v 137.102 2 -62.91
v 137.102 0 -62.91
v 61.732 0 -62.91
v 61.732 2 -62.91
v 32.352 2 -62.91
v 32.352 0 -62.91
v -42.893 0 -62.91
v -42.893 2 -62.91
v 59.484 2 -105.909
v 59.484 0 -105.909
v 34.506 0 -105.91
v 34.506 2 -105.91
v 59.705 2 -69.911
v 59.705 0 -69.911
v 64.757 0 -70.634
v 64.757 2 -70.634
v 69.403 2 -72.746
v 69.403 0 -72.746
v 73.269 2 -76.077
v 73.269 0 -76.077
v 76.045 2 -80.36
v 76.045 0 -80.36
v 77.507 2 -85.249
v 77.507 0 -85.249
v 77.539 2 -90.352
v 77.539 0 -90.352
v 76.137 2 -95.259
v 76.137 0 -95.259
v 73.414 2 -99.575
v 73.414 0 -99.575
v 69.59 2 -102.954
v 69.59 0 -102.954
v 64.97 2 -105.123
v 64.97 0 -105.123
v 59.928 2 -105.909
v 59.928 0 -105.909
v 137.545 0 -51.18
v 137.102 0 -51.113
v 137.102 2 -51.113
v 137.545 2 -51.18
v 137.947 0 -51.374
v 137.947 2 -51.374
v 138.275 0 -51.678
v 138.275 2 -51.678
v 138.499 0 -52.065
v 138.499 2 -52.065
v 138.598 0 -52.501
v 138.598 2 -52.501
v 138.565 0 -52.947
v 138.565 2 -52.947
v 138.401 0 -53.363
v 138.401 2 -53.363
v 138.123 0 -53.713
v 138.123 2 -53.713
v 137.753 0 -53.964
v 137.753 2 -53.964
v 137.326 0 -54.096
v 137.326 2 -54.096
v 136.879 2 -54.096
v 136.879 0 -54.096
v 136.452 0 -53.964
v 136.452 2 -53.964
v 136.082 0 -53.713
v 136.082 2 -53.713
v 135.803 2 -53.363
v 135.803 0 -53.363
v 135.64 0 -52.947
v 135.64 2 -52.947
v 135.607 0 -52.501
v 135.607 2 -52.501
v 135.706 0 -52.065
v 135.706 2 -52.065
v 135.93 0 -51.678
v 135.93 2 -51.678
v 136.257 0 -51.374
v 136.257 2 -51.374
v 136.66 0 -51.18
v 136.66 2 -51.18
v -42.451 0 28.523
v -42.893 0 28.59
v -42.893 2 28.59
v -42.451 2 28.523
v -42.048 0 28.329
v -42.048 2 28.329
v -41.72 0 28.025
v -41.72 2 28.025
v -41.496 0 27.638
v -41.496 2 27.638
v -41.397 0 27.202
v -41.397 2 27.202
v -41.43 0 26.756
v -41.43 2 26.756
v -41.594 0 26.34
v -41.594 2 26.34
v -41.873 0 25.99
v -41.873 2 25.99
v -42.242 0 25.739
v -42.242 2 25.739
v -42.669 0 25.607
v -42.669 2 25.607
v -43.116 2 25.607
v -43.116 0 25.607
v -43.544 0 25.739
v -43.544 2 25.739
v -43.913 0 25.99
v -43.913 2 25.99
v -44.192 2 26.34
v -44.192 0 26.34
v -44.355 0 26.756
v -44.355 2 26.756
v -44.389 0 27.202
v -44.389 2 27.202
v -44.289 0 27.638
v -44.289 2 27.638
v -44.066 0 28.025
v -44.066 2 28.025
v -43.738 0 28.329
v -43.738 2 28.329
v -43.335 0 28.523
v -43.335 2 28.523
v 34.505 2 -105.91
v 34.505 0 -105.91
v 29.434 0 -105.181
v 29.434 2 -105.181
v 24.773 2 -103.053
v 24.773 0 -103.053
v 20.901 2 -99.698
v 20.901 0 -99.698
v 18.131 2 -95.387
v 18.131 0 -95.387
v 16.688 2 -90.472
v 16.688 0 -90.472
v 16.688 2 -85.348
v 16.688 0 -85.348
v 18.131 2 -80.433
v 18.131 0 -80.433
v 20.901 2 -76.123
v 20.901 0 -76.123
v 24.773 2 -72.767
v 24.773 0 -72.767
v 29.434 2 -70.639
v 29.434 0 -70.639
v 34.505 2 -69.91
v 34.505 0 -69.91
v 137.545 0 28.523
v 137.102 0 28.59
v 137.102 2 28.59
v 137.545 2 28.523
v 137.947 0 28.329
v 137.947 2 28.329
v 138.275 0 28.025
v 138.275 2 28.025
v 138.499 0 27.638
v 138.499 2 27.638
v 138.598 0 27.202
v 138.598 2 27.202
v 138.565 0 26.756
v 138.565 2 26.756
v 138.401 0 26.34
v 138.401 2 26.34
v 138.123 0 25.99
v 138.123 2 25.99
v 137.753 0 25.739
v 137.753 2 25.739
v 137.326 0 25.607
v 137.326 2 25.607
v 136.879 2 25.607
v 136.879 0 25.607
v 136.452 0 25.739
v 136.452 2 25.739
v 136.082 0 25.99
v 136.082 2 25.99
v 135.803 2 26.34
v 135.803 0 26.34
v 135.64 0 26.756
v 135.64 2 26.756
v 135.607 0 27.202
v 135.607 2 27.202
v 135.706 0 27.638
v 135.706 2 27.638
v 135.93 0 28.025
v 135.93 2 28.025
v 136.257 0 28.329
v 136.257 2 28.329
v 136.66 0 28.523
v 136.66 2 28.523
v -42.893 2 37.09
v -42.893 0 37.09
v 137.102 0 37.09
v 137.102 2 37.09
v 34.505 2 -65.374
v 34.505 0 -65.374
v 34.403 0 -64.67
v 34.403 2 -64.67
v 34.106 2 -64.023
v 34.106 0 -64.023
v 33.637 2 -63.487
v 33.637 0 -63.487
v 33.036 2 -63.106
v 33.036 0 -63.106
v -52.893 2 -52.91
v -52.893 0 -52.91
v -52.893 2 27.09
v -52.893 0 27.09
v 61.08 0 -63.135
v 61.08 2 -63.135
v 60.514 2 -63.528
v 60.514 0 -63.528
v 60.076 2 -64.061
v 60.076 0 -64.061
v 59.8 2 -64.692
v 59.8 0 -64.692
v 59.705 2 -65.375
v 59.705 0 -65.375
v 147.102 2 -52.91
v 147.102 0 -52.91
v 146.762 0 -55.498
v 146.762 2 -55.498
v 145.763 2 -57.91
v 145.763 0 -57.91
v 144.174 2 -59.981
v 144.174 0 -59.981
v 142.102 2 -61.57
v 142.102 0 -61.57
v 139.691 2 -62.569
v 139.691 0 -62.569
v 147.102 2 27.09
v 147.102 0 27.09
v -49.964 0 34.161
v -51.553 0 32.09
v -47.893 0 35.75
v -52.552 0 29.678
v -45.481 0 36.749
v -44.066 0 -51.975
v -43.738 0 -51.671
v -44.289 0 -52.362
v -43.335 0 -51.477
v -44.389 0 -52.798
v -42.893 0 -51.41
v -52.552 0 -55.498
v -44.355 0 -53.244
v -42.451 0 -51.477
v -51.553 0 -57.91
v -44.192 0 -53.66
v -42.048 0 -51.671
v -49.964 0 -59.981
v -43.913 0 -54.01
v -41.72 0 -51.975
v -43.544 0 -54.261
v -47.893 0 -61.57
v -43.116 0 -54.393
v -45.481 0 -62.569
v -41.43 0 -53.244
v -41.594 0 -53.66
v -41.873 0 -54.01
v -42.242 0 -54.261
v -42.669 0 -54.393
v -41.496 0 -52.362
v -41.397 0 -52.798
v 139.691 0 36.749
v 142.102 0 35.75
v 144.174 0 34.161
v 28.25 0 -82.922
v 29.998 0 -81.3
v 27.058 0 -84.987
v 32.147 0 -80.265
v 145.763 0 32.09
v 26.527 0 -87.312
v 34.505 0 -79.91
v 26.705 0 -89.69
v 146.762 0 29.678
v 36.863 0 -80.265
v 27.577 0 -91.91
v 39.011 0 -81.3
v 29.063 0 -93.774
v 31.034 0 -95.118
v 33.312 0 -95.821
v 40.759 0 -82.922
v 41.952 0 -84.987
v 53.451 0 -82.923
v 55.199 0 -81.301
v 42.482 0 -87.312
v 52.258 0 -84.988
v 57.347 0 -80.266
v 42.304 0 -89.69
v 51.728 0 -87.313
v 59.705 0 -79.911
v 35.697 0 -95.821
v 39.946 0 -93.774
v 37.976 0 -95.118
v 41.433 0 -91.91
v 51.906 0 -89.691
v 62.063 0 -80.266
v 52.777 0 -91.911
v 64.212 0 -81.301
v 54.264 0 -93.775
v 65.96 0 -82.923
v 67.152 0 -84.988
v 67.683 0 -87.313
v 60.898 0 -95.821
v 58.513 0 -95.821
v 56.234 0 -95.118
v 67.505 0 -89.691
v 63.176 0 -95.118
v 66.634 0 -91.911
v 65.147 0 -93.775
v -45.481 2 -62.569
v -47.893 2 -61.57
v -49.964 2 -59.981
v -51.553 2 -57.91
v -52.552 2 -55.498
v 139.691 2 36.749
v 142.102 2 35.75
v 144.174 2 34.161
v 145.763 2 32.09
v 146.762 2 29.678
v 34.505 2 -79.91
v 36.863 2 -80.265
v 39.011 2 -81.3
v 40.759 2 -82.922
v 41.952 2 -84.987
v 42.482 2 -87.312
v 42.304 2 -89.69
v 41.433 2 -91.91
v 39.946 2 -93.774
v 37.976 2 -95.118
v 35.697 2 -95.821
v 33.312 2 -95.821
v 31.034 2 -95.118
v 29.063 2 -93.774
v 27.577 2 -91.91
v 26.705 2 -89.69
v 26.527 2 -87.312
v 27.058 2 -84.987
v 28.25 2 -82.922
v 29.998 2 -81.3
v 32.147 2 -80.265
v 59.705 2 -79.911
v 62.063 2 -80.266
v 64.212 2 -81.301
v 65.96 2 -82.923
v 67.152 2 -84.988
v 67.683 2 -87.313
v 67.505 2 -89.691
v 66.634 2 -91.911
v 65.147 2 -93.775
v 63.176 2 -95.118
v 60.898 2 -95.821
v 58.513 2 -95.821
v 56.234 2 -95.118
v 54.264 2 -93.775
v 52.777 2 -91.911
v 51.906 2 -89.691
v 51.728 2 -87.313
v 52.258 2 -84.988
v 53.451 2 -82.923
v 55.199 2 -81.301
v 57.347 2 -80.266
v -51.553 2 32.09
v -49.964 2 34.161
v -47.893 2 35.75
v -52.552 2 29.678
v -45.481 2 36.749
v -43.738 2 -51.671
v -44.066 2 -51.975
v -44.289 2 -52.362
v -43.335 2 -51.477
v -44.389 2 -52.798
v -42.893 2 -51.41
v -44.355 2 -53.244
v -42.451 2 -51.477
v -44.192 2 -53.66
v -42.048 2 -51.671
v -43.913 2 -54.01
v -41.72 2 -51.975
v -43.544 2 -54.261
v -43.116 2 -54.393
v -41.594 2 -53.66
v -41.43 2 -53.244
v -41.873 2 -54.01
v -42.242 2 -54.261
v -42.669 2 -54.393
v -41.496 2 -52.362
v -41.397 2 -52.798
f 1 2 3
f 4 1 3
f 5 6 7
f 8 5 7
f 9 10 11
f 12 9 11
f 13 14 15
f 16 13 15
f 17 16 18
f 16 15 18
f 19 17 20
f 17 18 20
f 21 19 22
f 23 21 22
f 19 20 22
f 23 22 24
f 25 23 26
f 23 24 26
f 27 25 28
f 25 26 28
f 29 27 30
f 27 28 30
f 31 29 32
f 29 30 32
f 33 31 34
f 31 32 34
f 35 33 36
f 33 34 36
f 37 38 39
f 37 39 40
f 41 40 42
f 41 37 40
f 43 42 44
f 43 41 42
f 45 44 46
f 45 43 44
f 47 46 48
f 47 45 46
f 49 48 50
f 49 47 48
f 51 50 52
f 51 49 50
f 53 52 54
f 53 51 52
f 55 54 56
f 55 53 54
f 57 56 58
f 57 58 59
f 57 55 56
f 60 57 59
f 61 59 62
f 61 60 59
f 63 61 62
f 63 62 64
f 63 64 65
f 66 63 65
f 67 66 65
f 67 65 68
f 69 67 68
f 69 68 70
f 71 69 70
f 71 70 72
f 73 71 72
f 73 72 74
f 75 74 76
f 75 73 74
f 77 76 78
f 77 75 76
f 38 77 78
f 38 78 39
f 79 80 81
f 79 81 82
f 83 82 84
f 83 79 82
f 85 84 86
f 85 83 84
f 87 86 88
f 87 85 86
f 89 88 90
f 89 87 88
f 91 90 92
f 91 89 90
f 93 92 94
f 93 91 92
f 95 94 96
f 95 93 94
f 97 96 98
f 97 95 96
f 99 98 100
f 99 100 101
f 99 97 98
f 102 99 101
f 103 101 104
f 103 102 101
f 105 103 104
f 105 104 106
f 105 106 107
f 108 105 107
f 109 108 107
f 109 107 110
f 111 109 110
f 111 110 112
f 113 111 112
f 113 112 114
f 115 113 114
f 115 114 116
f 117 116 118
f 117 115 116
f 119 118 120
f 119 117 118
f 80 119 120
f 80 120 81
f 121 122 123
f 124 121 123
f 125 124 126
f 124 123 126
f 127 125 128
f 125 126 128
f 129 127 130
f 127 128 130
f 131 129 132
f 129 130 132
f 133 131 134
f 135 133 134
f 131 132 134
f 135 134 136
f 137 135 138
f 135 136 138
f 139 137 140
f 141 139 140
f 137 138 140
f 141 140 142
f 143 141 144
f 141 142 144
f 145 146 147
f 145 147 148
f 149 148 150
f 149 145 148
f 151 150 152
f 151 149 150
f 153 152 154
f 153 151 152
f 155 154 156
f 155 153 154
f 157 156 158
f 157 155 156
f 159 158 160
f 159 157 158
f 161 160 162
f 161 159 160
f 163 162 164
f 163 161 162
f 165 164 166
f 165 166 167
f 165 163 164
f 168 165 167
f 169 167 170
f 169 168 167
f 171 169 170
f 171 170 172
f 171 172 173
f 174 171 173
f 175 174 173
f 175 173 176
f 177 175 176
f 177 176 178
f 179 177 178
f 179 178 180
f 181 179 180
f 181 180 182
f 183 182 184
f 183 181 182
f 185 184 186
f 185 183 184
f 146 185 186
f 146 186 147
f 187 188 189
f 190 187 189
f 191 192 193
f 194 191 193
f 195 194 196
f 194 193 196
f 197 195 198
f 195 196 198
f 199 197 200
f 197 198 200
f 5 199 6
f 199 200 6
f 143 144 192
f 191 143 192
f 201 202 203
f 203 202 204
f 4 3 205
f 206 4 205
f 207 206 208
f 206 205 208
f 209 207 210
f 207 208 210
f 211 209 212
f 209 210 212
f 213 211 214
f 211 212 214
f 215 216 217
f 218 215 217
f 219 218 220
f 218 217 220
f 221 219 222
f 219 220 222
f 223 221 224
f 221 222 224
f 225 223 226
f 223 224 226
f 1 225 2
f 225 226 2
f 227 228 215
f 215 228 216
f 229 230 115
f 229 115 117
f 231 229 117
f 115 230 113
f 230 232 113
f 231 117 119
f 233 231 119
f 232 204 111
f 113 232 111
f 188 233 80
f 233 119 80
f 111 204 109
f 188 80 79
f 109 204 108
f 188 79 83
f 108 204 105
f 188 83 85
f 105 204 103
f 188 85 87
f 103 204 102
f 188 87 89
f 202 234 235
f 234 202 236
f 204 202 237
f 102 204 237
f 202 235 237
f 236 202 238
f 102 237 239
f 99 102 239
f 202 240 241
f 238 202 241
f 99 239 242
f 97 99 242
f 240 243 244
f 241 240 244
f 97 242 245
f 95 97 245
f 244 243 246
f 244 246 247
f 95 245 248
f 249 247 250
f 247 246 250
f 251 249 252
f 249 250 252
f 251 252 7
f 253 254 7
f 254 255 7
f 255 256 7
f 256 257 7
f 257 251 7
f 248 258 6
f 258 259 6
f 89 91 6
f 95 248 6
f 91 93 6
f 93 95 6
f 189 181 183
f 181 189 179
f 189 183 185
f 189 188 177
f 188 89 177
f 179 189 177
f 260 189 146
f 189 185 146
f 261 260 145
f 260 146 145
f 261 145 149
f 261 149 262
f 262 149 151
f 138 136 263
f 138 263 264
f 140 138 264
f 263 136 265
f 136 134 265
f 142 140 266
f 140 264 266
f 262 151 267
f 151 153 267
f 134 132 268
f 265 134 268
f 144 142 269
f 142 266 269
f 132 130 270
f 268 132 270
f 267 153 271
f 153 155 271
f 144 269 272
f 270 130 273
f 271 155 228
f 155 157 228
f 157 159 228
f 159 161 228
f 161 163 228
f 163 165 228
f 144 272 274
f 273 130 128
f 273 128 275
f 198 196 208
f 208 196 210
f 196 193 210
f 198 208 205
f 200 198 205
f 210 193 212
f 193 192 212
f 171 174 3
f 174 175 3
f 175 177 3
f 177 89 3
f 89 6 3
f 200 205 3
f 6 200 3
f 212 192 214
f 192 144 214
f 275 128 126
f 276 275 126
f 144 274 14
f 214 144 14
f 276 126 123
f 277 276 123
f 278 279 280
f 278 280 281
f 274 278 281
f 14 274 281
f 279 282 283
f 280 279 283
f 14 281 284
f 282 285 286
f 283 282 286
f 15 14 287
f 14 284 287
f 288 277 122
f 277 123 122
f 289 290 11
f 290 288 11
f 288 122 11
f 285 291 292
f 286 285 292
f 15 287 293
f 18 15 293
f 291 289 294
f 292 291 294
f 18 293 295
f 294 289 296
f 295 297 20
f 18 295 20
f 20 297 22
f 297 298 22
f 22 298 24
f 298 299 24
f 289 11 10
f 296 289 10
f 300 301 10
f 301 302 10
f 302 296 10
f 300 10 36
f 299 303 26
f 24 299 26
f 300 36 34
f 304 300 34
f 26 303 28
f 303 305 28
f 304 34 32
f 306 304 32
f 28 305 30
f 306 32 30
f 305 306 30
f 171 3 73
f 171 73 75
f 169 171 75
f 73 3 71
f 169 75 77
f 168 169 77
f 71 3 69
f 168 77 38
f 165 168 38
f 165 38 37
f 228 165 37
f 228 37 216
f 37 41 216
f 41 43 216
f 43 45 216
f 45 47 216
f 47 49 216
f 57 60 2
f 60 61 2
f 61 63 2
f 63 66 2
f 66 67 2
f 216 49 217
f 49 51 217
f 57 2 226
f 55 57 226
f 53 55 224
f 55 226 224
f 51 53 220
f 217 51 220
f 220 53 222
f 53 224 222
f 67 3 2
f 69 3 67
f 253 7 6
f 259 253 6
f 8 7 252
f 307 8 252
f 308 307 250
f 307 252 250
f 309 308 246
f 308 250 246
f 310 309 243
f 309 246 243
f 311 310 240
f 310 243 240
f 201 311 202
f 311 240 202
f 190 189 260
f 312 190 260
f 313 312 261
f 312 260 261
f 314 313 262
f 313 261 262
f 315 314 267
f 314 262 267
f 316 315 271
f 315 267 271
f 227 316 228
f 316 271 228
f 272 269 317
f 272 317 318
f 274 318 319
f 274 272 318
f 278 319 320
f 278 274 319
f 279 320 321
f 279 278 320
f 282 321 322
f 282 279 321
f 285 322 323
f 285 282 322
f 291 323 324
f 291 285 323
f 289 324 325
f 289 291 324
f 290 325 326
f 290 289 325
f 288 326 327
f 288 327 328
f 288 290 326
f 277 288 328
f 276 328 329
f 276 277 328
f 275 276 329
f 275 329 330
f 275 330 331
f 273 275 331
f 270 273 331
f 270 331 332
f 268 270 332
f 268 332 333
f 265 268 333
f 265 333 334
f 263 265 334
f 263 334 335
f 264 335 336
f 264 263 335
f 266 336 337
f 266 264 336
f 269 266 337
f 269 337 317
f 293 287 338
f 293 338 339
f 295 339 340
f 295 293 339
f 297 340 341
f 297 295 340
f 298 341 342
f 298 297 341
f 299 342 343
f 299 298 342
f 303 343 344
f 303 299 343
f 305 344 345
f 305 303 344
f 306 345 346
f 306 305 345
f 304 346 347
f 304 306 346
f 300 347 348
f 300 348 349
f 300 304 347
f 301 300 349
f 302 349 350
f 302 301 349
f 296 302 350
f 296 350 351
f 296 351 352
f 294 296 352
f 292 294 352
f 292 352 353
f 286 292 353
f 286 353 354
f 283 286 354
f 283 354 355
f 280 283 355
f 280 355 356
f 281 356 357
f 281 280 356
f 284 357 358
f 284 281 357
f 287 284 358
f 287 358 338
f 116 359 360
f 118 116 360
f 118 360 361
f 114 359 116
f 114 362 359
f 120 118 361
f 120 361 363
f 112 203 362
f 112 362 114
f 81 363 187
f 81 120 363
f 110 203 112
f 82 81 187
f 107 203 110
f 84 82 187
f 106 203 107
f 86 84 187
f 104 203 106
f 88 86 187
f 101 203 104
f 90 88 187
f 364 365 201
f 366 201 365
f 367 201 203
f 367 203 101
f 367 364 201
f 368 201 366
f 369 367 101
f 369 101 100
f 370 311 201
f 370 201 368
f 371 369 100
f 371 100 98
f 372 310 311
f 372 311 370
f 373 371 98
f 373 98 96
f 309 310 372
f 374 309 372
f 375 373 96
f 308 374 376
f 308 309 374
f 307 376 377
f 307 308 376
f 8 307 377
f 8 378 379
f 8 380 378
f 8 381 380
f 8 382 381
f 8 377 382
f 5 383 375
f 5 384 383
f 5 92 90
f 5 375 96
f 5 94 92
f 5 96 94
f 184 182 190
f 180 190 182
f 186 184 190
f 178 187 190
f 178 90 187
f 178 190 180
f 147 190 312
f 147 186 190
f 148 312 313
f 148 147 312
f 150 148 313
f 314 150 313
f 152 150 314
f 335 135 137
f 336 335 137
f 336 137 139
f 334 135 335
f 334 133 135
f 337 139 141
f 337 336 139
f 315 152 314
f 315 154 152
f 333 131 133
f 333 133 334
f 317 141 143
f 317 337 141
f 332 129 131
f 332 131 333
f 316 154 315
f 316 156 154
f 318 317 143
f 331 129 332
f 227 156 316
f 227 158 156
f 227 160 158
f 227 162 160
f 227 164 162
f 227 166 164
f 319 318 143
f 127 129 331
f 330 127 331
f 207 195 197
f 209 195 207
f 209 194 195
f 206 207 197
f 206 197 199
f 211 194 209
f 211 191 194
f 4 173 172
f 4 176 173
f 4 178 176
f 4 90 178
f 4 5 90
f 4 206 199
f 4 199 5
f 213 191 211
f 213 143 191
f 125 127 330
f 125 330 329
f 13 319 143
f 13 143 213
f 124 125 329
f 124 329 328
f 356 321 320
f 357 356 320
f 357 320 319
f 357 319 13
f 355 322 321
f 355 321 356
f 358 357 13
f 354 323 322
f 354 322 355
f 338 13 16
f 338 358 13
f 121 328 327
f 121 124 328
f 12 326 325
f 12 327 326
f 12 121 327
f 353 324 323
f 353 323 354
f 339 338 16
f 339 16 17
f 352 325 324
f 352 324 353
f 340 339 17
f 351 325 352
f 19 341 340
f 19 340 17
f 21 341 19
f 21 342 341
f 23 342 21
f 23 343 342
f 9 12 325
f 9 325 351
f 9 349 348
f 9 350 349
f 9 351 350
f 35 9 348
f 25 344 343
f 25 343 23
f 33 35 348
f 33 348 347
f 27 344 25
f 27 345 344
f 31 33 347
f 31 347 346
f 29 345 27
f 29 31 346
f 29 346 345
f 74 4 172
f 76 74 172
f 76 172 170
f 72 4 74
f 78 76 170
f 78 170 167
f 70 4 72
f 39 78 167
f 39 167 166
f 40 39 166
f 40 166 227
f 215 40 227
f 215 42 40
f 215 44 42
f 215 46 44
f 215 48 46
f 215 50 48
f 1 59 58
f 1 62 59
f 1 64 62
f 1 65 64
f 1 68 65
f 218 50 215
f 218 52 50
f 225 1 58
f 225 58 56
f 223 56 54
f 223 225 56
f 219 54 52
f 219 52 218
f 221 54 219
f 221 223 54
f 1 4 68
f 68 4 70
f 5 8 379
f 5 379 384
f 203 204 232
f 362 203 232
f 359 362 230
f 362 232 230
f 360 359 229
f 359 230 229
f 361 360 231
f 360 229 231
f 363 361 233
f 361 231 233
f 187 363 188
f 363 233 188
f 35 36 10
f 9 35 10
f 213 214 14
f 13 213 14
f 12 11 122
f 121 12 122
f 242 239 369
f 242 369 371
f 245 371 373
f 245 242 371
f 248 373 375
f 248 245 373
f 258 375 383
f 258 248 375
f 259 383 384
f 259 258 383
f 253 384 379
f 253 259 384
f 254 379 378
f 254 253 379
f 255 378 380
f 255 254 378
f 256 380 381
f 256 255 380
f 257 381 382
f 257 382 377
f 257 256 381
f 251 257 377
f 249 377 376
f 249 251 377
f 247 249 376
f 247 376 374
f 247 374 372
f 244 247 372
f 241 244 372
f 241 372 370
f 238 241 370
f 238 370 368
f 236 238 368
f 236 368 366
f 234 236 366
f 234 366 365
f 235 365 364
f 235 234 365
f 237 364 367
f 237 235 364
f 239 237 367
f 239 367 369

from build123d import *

# Parameters (mm, degrees)
SKETCH1_R           = 1.5
SKETCH1_R_2         = 8
BOSS_EXTRUDE6_DEPTH = 2


with BuildPart() as part:
    # Sketch1 → Boss-Extrude6 (new body)
    with BuildSketch(Plane(origin=(0, 0, 0), x_dir=(1, 0, 0), z_dir=(0, 1, 0))):
        with BuildLine():
            ThreePointArc((-42.892787305, 62.910010988), (-49.963855117, 59.981078799), (-52.892787305, 52.910010988))
            Line((-52.892787305, 52.910010988), (-52.892787305, 24.160010988))
            Line((-52.892787305, 24.160010988), (-52.892787305, 1.660010988))
            Line((-52.892787305, 1.660010988), (-52.892787305, -27.089989012))
            ThreePointArc((-52.892787305, -27.089989012), (-49.963855117, -34.161056824), (-42.892787305, -37.089989012))
            Line((-42.892787305, -37.089989012), (137.102440603, -37.089989012))
            ThreePointArc((137.102440603, -37.089989012), (144.173508414, -34.161056824), (147.102440603, -27.089989012))
            Line((147.102440603, -27.089989012), (147.102440603, 1.660010988))
            Line((147.102440603, 1.660010988), (147.102440603, 24.160010988))
            Line((147.102440603, 24.160010988), (147.102440603, 52.910010988))
            ThreePointArc((147.102440603, 52.910010988), (144.173508414, 59.981078799), (137.102440603, 62.910010988))
            Line((137.102440603, 62.910010988), (61.731596977, 62.910010988))
            ThreePointArc((61.731596977, 62.910010988), (60.27668109, 63.779465055), (59.705316327, 65.375169578))
            Line((59.705316327, 65.375169578), (59.705316327, 69.910696544))
            ThreePointArc((59.705316327, 69.910696544), (77.704972023, 87.799364481), (59.927976193, 105.909319341))
            Line((59.927976193, 105.909319341), (59.483635762, 105.909331429))
            Line((59.483635762, 105.909331429), (34.505806024, 105.910010948))
            Line((34.505806024, 105.910010948), (34.504826649, 105.910010974))
            ThreePointArc((34.504826649, 105.910010974), (16.504826662, 87.910010988), (34.504826649, 69.910011001))
            Line((34.504826649, 69.910011001), (34.504826649, 65.374484021))
            ThreePointArc((34.504826649, 65.374484021), (33.890722022, 63.738204886), (32.35168701, 62.910010988))
            Line((32.35168701, 62.910010988), (-42.892787305, 62.910010988))
        make_face()
        with Locations(Location((-42.892787305, -27.089989012, 0), (0, 0, 270))):
            Circle(SKETCH1_R, mode=Mode.SUBTRACT)
        with Locations(Location((137.102440603, -27.089989012, 0), (0, 0, 270))):
            Circle(SKETCH1_R, mode=Mode.SUBTRACT)
        with Locations(Location((-42.892787305, 52.910010988, 0), (0, 0, 270))):
            Circle(SKETCH1_R, mode=Mode.SUBTRACT)
        with Locations(Location((34.504826649, 87.910010988, 0), (0, 0, 270))):
            Circle(SKETCH1_R_2, mode=Mode.SUBTRACT)
        with Locations(Location((137.102440603, 52.612926661, 0), (0, 0, 270))):
            Circle(SKETCH1_R, mode=Mode.SUBTRACT)
        with Locations(Location((59.705316327, 87.910696544, 0), (0, 0, 270))):
            Circle(SKETCH1_R_2, mode=Mode.SUBTRACT)
    extrude(amount=BOSS_EXTRUDE6_DEPTH)


solid = part.part
